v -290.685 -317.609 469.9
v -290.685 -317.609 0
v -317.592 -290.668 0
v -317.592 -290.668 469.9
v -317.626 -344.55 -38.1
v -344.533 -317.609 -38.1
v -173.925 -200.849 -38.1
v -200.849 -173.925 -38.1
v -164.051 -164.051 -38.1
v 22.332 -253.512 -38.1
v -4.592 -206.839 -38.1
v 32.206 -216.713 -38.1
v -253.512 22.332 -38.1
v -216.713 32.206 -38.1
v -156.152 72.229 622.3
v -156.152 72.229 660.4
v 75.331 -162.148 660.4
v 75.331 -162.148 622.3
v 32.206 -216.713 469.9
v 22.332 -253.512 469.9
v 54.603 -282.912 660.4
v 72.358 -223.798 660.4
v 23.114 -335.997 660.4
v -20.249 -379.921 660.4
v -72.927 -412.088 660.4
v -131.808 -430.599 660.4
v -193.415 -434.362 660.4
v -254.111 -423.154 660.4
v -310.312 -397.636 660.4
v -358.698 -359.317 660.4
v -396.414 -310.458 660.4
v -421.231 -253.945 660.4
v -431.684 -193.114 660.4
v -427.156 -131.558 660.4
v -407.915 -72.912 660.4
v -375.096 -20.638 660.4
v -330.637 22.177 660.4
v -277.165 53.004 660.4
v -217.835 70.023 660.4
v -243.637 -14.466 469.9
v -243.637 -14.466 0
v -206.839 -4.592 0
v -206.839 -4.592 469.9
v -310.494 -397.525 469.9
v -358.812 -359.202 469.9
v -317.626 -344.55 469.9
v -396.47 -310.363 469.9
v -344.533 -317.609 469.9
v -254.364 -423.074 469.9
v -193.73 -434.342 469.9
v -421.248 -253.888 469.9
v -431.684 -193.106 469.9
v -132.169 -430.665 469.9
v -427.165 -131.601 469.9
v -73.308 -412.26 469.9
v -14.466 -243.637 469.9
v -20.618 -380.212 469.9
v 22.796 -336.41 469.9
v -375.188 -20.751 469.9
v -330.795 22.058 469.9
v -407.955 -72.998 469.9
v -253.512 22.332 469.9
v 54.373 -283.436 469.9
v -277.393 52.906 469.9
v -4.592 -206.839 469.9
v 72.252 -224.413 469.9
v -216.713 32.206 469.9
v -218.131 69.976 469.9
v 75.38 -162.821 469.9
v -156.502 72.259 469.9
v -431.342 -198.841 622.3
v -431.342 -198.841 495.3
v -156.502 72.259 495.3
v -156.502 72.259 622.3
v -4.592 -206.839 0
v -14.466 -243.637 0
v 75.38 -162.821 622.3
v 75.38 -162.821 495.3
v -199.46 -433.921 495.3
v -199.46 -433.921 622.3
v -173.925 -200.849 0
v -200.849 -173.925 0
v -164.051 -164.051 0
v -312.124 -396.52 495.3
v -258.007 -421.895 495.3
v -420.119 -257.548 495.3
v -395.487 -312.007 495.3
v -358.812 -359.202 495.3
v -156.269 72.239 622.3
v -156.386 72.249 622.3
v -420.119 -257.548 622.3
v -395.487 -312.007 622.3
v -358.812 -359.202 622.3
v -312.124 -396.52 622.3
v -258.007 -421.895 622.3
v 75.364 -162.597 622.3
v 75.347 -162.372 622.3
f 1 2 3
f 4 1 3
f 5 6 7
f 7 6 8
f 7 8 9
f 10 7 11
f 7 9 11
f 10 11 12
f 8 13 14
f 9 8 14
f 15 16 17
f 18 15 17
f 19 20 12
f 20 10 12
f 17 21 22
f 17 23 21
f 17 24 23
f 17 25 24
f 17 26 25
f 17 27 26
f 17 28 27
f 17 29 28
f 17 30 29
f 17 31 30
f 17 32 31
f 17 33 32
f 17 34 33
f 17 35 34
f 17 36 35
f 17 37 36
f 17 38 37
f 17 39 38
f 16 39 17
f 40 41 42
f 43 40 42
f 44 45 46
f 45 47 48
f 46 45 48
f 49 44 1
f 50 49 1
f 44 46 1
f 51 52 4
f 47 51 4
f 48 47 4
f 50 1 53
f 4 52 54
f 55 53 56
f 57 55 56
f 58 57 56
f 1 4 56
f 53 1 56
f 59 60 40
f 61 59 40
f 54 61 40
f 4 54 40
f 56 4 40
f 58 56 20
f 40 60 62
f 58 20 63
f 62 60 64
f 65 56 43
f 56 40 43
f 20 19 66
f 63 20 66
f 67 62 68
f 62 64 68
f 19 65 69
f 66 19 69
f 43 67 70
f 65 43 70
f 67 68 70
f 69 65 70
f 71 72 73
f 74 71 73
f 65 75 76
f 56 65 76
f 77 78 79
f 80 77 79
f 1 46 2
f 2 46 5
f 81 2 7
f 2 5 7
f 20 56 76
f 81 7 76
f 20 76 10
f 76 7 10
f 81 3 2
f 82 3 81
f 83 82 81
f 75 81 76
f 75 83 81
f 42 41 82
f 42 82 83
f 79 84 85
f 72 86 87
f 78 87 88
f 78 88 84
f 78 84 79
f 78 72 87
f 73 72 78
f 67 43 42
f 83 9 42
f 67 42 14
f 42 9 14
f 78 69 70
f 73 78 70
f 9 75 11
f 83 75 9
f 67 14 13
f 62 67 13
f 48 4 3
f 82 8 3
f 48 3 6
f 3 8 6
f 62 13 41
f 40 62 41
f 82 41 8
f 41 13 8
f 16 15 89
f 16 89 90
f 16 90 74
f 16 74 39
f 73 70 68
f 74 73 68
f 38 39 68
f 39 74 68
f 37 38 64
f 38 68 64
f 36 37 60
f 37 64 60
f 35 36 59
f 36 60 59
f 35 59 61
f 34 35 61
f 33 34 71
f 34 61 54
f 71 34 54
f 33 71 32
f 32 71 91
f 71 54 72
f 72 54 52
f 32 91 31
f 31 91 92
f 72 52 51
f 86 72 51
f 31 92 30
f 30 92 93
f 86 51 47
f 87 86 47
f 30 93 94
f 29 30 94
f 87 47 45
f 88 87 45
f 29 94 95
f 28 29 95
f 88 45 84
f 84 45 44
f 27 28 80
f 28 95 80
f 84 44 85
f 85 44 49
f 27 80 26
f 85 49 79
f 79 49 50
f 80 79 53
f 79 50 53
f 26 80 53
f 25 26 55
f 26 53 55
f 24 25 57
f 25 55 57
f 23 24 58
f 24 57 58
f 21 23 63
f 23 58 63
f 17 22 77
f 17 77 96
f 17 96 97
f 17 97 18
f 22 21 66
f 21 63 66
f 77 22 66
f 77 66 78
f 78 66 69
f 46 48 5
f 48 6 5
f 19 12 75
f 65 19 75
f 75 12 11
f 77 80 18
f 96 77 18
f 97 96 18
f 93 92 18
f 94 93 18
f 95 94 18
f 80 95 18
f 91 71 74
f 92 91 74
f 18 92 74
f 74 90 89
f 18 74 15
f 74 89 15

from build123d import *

# Parameters (mm, degrees)
F1_DEPTH  = 38.1
F2_DEPTH  = 469.9
F3_DEPTH  = 469.9
F4_DEPTH  = 469.9
F6_DEPTH  = 25.4
F8_DEPTH  = 127
F9_R      = 254
F10_DEPTH = 38.1
F12_DEPTH = 38.1


with BuildPart() as f1:
    # F0 (on Top) → F1 (new body)
    with BuildSketch(Plane.XY):
        Polygon((-164.0508631923, -164.0508649307), (-200.8490917777, -173.9250926458), (-173.9250929642, -200.8490929642), align=None)
        Polygon((-173.9250929642, -200.8490929642), (-200.8490917777, -173.9250926458), (-317.5924246142, -290.6684189572), (-290.6851930936, -317.6091865675), align=None)
        Polygon((-243.6374118769, -14.4661021088), (-200.8490917777, -173.9250926458), (-164.0508631923, -164.0508649307), (-206.8391832914, -4.5918743936), align=None)
        Polygon((-164.0508631923, -164.0508649307), (-173.9250929642, -200.8490929642), (-14.4661048188, -243.6374219761), (-4.5918750468, -206.8391939425), align=None)
        Polygon((-290.6851930936, -317.6091865675), (-317.5924246142, -290.6684189572), (-344.5331937303, -317.6091865675), (-317.6259622097, -344.5499541778), align=None)
        Polygon((-253.5116395921, 22.3321264767), (-243.6374118769, -14.4661021088), (-206.8391832914, -4.5918743936), (-216.7134110066, 32.2063541919), align=None)
        Polygon((-4.5918750468, -206.8391939425), (-14.4661048188, -243.6374219761), (22.3321232148, -253.5116517481), (32.2063529868, -216.7134237145), align=None)
    extrude(amount=-F1_DEPTH)

    # F0 (on Top) → F2 (join)
    with BuildSketch(Plane.XY):
        Polygon((-290.6851930936, -317.6091865675), (-317.5924246142, -290.6684189572), (-344.5331937303, -317.6091865675), (-317.6259622097, -344.5499541778), align=None)
    extrude(amount=F2_DEPTH)

    # F0 (on Top) → F3 (join)
    with BuildSketch(Plane.XY):
        Polygon((-4.5918750468, -206.8391939425), (-14.4661048188, -243.6374219761), (22.3321232148, -253.5116517481), (32.2063529868, -216.7134237145), align=None)
    extrude(amount=F3_DEPTH)

    # F0 (on Top) → F4 (join)
    with BuildSketch(Plane.XY):
        Polygon((-253.5116395921, 22.3321264767), (-243.6374118769, -14.4661021088), (-206.8391832914, -4.5918743936), (-216.7134110066, 32.2063541919), align=None)
    extrude(amount=F4_DEPTH)

    # F5 (on face) → F6 (join)
    with BuildSketch(Plane.XY.offset(469.9)):
        with BuildLine():
            Line((75.3796231443, -162.8212069793), (-156.5023640677, 72.2591707782))
            ThreePointArc((-156.5023640677, 72.2591707782), (-358.8121384382, -359.2018192073), (75.3796231443, -162.8212069793))
        make_face()
    extrude(amount=F6_DEPTH)

    # F7 (on face) → F8 (join)
    with BuildSketch(Plane.XY.offset(495.3)):
        with BuildLine():
            Line((75.3796231443, -162.8212069793), (-199.4597931818, -433.9212904052))
            ThreePointArc((-199.4597931818, -433.9212904052), (0.3896807691, -361.662119627), (75.3796231443, -162.8212069793))
        make_face()
        with BuildLine():
            ThreePointArc((-156.5023640677, 72.2591707782), (-356.3518380185, 0), (-431.3417803937, -198.8409126477))
            Line((-431.3417803937, -198.8409126477), (-156.5023640677, 72.2591707782))
        make_face()
    extrude(amount=F8_DEPTH)

    # F9 (on face) → F10 (join)
    with BuildSketch(Plane.XY.offset(622.3)):
        with Locations((-177.9810786247, -180.8310598135)):
            Circle(F9_R)
    extrude(amount=F10_DEPTH)

    # F11 (on face) → F12 (cut)
    with BuildSketch(Plane.XY.offset(660.4)):
        with BuildLine():
            ThreePointArc((75.3308407052, -162.1476038864), (2.7361824332, -2.3450055803), (-156.1522700542, 72.2292158451))
            Line((-156.1522700542, 72.2292158451), (75.3308407052, -162.1476038864))
        make_face()
    extrude(amount=-F12_DEPTH, mode=Mode.SUBTRACT)


solid = f1.part
